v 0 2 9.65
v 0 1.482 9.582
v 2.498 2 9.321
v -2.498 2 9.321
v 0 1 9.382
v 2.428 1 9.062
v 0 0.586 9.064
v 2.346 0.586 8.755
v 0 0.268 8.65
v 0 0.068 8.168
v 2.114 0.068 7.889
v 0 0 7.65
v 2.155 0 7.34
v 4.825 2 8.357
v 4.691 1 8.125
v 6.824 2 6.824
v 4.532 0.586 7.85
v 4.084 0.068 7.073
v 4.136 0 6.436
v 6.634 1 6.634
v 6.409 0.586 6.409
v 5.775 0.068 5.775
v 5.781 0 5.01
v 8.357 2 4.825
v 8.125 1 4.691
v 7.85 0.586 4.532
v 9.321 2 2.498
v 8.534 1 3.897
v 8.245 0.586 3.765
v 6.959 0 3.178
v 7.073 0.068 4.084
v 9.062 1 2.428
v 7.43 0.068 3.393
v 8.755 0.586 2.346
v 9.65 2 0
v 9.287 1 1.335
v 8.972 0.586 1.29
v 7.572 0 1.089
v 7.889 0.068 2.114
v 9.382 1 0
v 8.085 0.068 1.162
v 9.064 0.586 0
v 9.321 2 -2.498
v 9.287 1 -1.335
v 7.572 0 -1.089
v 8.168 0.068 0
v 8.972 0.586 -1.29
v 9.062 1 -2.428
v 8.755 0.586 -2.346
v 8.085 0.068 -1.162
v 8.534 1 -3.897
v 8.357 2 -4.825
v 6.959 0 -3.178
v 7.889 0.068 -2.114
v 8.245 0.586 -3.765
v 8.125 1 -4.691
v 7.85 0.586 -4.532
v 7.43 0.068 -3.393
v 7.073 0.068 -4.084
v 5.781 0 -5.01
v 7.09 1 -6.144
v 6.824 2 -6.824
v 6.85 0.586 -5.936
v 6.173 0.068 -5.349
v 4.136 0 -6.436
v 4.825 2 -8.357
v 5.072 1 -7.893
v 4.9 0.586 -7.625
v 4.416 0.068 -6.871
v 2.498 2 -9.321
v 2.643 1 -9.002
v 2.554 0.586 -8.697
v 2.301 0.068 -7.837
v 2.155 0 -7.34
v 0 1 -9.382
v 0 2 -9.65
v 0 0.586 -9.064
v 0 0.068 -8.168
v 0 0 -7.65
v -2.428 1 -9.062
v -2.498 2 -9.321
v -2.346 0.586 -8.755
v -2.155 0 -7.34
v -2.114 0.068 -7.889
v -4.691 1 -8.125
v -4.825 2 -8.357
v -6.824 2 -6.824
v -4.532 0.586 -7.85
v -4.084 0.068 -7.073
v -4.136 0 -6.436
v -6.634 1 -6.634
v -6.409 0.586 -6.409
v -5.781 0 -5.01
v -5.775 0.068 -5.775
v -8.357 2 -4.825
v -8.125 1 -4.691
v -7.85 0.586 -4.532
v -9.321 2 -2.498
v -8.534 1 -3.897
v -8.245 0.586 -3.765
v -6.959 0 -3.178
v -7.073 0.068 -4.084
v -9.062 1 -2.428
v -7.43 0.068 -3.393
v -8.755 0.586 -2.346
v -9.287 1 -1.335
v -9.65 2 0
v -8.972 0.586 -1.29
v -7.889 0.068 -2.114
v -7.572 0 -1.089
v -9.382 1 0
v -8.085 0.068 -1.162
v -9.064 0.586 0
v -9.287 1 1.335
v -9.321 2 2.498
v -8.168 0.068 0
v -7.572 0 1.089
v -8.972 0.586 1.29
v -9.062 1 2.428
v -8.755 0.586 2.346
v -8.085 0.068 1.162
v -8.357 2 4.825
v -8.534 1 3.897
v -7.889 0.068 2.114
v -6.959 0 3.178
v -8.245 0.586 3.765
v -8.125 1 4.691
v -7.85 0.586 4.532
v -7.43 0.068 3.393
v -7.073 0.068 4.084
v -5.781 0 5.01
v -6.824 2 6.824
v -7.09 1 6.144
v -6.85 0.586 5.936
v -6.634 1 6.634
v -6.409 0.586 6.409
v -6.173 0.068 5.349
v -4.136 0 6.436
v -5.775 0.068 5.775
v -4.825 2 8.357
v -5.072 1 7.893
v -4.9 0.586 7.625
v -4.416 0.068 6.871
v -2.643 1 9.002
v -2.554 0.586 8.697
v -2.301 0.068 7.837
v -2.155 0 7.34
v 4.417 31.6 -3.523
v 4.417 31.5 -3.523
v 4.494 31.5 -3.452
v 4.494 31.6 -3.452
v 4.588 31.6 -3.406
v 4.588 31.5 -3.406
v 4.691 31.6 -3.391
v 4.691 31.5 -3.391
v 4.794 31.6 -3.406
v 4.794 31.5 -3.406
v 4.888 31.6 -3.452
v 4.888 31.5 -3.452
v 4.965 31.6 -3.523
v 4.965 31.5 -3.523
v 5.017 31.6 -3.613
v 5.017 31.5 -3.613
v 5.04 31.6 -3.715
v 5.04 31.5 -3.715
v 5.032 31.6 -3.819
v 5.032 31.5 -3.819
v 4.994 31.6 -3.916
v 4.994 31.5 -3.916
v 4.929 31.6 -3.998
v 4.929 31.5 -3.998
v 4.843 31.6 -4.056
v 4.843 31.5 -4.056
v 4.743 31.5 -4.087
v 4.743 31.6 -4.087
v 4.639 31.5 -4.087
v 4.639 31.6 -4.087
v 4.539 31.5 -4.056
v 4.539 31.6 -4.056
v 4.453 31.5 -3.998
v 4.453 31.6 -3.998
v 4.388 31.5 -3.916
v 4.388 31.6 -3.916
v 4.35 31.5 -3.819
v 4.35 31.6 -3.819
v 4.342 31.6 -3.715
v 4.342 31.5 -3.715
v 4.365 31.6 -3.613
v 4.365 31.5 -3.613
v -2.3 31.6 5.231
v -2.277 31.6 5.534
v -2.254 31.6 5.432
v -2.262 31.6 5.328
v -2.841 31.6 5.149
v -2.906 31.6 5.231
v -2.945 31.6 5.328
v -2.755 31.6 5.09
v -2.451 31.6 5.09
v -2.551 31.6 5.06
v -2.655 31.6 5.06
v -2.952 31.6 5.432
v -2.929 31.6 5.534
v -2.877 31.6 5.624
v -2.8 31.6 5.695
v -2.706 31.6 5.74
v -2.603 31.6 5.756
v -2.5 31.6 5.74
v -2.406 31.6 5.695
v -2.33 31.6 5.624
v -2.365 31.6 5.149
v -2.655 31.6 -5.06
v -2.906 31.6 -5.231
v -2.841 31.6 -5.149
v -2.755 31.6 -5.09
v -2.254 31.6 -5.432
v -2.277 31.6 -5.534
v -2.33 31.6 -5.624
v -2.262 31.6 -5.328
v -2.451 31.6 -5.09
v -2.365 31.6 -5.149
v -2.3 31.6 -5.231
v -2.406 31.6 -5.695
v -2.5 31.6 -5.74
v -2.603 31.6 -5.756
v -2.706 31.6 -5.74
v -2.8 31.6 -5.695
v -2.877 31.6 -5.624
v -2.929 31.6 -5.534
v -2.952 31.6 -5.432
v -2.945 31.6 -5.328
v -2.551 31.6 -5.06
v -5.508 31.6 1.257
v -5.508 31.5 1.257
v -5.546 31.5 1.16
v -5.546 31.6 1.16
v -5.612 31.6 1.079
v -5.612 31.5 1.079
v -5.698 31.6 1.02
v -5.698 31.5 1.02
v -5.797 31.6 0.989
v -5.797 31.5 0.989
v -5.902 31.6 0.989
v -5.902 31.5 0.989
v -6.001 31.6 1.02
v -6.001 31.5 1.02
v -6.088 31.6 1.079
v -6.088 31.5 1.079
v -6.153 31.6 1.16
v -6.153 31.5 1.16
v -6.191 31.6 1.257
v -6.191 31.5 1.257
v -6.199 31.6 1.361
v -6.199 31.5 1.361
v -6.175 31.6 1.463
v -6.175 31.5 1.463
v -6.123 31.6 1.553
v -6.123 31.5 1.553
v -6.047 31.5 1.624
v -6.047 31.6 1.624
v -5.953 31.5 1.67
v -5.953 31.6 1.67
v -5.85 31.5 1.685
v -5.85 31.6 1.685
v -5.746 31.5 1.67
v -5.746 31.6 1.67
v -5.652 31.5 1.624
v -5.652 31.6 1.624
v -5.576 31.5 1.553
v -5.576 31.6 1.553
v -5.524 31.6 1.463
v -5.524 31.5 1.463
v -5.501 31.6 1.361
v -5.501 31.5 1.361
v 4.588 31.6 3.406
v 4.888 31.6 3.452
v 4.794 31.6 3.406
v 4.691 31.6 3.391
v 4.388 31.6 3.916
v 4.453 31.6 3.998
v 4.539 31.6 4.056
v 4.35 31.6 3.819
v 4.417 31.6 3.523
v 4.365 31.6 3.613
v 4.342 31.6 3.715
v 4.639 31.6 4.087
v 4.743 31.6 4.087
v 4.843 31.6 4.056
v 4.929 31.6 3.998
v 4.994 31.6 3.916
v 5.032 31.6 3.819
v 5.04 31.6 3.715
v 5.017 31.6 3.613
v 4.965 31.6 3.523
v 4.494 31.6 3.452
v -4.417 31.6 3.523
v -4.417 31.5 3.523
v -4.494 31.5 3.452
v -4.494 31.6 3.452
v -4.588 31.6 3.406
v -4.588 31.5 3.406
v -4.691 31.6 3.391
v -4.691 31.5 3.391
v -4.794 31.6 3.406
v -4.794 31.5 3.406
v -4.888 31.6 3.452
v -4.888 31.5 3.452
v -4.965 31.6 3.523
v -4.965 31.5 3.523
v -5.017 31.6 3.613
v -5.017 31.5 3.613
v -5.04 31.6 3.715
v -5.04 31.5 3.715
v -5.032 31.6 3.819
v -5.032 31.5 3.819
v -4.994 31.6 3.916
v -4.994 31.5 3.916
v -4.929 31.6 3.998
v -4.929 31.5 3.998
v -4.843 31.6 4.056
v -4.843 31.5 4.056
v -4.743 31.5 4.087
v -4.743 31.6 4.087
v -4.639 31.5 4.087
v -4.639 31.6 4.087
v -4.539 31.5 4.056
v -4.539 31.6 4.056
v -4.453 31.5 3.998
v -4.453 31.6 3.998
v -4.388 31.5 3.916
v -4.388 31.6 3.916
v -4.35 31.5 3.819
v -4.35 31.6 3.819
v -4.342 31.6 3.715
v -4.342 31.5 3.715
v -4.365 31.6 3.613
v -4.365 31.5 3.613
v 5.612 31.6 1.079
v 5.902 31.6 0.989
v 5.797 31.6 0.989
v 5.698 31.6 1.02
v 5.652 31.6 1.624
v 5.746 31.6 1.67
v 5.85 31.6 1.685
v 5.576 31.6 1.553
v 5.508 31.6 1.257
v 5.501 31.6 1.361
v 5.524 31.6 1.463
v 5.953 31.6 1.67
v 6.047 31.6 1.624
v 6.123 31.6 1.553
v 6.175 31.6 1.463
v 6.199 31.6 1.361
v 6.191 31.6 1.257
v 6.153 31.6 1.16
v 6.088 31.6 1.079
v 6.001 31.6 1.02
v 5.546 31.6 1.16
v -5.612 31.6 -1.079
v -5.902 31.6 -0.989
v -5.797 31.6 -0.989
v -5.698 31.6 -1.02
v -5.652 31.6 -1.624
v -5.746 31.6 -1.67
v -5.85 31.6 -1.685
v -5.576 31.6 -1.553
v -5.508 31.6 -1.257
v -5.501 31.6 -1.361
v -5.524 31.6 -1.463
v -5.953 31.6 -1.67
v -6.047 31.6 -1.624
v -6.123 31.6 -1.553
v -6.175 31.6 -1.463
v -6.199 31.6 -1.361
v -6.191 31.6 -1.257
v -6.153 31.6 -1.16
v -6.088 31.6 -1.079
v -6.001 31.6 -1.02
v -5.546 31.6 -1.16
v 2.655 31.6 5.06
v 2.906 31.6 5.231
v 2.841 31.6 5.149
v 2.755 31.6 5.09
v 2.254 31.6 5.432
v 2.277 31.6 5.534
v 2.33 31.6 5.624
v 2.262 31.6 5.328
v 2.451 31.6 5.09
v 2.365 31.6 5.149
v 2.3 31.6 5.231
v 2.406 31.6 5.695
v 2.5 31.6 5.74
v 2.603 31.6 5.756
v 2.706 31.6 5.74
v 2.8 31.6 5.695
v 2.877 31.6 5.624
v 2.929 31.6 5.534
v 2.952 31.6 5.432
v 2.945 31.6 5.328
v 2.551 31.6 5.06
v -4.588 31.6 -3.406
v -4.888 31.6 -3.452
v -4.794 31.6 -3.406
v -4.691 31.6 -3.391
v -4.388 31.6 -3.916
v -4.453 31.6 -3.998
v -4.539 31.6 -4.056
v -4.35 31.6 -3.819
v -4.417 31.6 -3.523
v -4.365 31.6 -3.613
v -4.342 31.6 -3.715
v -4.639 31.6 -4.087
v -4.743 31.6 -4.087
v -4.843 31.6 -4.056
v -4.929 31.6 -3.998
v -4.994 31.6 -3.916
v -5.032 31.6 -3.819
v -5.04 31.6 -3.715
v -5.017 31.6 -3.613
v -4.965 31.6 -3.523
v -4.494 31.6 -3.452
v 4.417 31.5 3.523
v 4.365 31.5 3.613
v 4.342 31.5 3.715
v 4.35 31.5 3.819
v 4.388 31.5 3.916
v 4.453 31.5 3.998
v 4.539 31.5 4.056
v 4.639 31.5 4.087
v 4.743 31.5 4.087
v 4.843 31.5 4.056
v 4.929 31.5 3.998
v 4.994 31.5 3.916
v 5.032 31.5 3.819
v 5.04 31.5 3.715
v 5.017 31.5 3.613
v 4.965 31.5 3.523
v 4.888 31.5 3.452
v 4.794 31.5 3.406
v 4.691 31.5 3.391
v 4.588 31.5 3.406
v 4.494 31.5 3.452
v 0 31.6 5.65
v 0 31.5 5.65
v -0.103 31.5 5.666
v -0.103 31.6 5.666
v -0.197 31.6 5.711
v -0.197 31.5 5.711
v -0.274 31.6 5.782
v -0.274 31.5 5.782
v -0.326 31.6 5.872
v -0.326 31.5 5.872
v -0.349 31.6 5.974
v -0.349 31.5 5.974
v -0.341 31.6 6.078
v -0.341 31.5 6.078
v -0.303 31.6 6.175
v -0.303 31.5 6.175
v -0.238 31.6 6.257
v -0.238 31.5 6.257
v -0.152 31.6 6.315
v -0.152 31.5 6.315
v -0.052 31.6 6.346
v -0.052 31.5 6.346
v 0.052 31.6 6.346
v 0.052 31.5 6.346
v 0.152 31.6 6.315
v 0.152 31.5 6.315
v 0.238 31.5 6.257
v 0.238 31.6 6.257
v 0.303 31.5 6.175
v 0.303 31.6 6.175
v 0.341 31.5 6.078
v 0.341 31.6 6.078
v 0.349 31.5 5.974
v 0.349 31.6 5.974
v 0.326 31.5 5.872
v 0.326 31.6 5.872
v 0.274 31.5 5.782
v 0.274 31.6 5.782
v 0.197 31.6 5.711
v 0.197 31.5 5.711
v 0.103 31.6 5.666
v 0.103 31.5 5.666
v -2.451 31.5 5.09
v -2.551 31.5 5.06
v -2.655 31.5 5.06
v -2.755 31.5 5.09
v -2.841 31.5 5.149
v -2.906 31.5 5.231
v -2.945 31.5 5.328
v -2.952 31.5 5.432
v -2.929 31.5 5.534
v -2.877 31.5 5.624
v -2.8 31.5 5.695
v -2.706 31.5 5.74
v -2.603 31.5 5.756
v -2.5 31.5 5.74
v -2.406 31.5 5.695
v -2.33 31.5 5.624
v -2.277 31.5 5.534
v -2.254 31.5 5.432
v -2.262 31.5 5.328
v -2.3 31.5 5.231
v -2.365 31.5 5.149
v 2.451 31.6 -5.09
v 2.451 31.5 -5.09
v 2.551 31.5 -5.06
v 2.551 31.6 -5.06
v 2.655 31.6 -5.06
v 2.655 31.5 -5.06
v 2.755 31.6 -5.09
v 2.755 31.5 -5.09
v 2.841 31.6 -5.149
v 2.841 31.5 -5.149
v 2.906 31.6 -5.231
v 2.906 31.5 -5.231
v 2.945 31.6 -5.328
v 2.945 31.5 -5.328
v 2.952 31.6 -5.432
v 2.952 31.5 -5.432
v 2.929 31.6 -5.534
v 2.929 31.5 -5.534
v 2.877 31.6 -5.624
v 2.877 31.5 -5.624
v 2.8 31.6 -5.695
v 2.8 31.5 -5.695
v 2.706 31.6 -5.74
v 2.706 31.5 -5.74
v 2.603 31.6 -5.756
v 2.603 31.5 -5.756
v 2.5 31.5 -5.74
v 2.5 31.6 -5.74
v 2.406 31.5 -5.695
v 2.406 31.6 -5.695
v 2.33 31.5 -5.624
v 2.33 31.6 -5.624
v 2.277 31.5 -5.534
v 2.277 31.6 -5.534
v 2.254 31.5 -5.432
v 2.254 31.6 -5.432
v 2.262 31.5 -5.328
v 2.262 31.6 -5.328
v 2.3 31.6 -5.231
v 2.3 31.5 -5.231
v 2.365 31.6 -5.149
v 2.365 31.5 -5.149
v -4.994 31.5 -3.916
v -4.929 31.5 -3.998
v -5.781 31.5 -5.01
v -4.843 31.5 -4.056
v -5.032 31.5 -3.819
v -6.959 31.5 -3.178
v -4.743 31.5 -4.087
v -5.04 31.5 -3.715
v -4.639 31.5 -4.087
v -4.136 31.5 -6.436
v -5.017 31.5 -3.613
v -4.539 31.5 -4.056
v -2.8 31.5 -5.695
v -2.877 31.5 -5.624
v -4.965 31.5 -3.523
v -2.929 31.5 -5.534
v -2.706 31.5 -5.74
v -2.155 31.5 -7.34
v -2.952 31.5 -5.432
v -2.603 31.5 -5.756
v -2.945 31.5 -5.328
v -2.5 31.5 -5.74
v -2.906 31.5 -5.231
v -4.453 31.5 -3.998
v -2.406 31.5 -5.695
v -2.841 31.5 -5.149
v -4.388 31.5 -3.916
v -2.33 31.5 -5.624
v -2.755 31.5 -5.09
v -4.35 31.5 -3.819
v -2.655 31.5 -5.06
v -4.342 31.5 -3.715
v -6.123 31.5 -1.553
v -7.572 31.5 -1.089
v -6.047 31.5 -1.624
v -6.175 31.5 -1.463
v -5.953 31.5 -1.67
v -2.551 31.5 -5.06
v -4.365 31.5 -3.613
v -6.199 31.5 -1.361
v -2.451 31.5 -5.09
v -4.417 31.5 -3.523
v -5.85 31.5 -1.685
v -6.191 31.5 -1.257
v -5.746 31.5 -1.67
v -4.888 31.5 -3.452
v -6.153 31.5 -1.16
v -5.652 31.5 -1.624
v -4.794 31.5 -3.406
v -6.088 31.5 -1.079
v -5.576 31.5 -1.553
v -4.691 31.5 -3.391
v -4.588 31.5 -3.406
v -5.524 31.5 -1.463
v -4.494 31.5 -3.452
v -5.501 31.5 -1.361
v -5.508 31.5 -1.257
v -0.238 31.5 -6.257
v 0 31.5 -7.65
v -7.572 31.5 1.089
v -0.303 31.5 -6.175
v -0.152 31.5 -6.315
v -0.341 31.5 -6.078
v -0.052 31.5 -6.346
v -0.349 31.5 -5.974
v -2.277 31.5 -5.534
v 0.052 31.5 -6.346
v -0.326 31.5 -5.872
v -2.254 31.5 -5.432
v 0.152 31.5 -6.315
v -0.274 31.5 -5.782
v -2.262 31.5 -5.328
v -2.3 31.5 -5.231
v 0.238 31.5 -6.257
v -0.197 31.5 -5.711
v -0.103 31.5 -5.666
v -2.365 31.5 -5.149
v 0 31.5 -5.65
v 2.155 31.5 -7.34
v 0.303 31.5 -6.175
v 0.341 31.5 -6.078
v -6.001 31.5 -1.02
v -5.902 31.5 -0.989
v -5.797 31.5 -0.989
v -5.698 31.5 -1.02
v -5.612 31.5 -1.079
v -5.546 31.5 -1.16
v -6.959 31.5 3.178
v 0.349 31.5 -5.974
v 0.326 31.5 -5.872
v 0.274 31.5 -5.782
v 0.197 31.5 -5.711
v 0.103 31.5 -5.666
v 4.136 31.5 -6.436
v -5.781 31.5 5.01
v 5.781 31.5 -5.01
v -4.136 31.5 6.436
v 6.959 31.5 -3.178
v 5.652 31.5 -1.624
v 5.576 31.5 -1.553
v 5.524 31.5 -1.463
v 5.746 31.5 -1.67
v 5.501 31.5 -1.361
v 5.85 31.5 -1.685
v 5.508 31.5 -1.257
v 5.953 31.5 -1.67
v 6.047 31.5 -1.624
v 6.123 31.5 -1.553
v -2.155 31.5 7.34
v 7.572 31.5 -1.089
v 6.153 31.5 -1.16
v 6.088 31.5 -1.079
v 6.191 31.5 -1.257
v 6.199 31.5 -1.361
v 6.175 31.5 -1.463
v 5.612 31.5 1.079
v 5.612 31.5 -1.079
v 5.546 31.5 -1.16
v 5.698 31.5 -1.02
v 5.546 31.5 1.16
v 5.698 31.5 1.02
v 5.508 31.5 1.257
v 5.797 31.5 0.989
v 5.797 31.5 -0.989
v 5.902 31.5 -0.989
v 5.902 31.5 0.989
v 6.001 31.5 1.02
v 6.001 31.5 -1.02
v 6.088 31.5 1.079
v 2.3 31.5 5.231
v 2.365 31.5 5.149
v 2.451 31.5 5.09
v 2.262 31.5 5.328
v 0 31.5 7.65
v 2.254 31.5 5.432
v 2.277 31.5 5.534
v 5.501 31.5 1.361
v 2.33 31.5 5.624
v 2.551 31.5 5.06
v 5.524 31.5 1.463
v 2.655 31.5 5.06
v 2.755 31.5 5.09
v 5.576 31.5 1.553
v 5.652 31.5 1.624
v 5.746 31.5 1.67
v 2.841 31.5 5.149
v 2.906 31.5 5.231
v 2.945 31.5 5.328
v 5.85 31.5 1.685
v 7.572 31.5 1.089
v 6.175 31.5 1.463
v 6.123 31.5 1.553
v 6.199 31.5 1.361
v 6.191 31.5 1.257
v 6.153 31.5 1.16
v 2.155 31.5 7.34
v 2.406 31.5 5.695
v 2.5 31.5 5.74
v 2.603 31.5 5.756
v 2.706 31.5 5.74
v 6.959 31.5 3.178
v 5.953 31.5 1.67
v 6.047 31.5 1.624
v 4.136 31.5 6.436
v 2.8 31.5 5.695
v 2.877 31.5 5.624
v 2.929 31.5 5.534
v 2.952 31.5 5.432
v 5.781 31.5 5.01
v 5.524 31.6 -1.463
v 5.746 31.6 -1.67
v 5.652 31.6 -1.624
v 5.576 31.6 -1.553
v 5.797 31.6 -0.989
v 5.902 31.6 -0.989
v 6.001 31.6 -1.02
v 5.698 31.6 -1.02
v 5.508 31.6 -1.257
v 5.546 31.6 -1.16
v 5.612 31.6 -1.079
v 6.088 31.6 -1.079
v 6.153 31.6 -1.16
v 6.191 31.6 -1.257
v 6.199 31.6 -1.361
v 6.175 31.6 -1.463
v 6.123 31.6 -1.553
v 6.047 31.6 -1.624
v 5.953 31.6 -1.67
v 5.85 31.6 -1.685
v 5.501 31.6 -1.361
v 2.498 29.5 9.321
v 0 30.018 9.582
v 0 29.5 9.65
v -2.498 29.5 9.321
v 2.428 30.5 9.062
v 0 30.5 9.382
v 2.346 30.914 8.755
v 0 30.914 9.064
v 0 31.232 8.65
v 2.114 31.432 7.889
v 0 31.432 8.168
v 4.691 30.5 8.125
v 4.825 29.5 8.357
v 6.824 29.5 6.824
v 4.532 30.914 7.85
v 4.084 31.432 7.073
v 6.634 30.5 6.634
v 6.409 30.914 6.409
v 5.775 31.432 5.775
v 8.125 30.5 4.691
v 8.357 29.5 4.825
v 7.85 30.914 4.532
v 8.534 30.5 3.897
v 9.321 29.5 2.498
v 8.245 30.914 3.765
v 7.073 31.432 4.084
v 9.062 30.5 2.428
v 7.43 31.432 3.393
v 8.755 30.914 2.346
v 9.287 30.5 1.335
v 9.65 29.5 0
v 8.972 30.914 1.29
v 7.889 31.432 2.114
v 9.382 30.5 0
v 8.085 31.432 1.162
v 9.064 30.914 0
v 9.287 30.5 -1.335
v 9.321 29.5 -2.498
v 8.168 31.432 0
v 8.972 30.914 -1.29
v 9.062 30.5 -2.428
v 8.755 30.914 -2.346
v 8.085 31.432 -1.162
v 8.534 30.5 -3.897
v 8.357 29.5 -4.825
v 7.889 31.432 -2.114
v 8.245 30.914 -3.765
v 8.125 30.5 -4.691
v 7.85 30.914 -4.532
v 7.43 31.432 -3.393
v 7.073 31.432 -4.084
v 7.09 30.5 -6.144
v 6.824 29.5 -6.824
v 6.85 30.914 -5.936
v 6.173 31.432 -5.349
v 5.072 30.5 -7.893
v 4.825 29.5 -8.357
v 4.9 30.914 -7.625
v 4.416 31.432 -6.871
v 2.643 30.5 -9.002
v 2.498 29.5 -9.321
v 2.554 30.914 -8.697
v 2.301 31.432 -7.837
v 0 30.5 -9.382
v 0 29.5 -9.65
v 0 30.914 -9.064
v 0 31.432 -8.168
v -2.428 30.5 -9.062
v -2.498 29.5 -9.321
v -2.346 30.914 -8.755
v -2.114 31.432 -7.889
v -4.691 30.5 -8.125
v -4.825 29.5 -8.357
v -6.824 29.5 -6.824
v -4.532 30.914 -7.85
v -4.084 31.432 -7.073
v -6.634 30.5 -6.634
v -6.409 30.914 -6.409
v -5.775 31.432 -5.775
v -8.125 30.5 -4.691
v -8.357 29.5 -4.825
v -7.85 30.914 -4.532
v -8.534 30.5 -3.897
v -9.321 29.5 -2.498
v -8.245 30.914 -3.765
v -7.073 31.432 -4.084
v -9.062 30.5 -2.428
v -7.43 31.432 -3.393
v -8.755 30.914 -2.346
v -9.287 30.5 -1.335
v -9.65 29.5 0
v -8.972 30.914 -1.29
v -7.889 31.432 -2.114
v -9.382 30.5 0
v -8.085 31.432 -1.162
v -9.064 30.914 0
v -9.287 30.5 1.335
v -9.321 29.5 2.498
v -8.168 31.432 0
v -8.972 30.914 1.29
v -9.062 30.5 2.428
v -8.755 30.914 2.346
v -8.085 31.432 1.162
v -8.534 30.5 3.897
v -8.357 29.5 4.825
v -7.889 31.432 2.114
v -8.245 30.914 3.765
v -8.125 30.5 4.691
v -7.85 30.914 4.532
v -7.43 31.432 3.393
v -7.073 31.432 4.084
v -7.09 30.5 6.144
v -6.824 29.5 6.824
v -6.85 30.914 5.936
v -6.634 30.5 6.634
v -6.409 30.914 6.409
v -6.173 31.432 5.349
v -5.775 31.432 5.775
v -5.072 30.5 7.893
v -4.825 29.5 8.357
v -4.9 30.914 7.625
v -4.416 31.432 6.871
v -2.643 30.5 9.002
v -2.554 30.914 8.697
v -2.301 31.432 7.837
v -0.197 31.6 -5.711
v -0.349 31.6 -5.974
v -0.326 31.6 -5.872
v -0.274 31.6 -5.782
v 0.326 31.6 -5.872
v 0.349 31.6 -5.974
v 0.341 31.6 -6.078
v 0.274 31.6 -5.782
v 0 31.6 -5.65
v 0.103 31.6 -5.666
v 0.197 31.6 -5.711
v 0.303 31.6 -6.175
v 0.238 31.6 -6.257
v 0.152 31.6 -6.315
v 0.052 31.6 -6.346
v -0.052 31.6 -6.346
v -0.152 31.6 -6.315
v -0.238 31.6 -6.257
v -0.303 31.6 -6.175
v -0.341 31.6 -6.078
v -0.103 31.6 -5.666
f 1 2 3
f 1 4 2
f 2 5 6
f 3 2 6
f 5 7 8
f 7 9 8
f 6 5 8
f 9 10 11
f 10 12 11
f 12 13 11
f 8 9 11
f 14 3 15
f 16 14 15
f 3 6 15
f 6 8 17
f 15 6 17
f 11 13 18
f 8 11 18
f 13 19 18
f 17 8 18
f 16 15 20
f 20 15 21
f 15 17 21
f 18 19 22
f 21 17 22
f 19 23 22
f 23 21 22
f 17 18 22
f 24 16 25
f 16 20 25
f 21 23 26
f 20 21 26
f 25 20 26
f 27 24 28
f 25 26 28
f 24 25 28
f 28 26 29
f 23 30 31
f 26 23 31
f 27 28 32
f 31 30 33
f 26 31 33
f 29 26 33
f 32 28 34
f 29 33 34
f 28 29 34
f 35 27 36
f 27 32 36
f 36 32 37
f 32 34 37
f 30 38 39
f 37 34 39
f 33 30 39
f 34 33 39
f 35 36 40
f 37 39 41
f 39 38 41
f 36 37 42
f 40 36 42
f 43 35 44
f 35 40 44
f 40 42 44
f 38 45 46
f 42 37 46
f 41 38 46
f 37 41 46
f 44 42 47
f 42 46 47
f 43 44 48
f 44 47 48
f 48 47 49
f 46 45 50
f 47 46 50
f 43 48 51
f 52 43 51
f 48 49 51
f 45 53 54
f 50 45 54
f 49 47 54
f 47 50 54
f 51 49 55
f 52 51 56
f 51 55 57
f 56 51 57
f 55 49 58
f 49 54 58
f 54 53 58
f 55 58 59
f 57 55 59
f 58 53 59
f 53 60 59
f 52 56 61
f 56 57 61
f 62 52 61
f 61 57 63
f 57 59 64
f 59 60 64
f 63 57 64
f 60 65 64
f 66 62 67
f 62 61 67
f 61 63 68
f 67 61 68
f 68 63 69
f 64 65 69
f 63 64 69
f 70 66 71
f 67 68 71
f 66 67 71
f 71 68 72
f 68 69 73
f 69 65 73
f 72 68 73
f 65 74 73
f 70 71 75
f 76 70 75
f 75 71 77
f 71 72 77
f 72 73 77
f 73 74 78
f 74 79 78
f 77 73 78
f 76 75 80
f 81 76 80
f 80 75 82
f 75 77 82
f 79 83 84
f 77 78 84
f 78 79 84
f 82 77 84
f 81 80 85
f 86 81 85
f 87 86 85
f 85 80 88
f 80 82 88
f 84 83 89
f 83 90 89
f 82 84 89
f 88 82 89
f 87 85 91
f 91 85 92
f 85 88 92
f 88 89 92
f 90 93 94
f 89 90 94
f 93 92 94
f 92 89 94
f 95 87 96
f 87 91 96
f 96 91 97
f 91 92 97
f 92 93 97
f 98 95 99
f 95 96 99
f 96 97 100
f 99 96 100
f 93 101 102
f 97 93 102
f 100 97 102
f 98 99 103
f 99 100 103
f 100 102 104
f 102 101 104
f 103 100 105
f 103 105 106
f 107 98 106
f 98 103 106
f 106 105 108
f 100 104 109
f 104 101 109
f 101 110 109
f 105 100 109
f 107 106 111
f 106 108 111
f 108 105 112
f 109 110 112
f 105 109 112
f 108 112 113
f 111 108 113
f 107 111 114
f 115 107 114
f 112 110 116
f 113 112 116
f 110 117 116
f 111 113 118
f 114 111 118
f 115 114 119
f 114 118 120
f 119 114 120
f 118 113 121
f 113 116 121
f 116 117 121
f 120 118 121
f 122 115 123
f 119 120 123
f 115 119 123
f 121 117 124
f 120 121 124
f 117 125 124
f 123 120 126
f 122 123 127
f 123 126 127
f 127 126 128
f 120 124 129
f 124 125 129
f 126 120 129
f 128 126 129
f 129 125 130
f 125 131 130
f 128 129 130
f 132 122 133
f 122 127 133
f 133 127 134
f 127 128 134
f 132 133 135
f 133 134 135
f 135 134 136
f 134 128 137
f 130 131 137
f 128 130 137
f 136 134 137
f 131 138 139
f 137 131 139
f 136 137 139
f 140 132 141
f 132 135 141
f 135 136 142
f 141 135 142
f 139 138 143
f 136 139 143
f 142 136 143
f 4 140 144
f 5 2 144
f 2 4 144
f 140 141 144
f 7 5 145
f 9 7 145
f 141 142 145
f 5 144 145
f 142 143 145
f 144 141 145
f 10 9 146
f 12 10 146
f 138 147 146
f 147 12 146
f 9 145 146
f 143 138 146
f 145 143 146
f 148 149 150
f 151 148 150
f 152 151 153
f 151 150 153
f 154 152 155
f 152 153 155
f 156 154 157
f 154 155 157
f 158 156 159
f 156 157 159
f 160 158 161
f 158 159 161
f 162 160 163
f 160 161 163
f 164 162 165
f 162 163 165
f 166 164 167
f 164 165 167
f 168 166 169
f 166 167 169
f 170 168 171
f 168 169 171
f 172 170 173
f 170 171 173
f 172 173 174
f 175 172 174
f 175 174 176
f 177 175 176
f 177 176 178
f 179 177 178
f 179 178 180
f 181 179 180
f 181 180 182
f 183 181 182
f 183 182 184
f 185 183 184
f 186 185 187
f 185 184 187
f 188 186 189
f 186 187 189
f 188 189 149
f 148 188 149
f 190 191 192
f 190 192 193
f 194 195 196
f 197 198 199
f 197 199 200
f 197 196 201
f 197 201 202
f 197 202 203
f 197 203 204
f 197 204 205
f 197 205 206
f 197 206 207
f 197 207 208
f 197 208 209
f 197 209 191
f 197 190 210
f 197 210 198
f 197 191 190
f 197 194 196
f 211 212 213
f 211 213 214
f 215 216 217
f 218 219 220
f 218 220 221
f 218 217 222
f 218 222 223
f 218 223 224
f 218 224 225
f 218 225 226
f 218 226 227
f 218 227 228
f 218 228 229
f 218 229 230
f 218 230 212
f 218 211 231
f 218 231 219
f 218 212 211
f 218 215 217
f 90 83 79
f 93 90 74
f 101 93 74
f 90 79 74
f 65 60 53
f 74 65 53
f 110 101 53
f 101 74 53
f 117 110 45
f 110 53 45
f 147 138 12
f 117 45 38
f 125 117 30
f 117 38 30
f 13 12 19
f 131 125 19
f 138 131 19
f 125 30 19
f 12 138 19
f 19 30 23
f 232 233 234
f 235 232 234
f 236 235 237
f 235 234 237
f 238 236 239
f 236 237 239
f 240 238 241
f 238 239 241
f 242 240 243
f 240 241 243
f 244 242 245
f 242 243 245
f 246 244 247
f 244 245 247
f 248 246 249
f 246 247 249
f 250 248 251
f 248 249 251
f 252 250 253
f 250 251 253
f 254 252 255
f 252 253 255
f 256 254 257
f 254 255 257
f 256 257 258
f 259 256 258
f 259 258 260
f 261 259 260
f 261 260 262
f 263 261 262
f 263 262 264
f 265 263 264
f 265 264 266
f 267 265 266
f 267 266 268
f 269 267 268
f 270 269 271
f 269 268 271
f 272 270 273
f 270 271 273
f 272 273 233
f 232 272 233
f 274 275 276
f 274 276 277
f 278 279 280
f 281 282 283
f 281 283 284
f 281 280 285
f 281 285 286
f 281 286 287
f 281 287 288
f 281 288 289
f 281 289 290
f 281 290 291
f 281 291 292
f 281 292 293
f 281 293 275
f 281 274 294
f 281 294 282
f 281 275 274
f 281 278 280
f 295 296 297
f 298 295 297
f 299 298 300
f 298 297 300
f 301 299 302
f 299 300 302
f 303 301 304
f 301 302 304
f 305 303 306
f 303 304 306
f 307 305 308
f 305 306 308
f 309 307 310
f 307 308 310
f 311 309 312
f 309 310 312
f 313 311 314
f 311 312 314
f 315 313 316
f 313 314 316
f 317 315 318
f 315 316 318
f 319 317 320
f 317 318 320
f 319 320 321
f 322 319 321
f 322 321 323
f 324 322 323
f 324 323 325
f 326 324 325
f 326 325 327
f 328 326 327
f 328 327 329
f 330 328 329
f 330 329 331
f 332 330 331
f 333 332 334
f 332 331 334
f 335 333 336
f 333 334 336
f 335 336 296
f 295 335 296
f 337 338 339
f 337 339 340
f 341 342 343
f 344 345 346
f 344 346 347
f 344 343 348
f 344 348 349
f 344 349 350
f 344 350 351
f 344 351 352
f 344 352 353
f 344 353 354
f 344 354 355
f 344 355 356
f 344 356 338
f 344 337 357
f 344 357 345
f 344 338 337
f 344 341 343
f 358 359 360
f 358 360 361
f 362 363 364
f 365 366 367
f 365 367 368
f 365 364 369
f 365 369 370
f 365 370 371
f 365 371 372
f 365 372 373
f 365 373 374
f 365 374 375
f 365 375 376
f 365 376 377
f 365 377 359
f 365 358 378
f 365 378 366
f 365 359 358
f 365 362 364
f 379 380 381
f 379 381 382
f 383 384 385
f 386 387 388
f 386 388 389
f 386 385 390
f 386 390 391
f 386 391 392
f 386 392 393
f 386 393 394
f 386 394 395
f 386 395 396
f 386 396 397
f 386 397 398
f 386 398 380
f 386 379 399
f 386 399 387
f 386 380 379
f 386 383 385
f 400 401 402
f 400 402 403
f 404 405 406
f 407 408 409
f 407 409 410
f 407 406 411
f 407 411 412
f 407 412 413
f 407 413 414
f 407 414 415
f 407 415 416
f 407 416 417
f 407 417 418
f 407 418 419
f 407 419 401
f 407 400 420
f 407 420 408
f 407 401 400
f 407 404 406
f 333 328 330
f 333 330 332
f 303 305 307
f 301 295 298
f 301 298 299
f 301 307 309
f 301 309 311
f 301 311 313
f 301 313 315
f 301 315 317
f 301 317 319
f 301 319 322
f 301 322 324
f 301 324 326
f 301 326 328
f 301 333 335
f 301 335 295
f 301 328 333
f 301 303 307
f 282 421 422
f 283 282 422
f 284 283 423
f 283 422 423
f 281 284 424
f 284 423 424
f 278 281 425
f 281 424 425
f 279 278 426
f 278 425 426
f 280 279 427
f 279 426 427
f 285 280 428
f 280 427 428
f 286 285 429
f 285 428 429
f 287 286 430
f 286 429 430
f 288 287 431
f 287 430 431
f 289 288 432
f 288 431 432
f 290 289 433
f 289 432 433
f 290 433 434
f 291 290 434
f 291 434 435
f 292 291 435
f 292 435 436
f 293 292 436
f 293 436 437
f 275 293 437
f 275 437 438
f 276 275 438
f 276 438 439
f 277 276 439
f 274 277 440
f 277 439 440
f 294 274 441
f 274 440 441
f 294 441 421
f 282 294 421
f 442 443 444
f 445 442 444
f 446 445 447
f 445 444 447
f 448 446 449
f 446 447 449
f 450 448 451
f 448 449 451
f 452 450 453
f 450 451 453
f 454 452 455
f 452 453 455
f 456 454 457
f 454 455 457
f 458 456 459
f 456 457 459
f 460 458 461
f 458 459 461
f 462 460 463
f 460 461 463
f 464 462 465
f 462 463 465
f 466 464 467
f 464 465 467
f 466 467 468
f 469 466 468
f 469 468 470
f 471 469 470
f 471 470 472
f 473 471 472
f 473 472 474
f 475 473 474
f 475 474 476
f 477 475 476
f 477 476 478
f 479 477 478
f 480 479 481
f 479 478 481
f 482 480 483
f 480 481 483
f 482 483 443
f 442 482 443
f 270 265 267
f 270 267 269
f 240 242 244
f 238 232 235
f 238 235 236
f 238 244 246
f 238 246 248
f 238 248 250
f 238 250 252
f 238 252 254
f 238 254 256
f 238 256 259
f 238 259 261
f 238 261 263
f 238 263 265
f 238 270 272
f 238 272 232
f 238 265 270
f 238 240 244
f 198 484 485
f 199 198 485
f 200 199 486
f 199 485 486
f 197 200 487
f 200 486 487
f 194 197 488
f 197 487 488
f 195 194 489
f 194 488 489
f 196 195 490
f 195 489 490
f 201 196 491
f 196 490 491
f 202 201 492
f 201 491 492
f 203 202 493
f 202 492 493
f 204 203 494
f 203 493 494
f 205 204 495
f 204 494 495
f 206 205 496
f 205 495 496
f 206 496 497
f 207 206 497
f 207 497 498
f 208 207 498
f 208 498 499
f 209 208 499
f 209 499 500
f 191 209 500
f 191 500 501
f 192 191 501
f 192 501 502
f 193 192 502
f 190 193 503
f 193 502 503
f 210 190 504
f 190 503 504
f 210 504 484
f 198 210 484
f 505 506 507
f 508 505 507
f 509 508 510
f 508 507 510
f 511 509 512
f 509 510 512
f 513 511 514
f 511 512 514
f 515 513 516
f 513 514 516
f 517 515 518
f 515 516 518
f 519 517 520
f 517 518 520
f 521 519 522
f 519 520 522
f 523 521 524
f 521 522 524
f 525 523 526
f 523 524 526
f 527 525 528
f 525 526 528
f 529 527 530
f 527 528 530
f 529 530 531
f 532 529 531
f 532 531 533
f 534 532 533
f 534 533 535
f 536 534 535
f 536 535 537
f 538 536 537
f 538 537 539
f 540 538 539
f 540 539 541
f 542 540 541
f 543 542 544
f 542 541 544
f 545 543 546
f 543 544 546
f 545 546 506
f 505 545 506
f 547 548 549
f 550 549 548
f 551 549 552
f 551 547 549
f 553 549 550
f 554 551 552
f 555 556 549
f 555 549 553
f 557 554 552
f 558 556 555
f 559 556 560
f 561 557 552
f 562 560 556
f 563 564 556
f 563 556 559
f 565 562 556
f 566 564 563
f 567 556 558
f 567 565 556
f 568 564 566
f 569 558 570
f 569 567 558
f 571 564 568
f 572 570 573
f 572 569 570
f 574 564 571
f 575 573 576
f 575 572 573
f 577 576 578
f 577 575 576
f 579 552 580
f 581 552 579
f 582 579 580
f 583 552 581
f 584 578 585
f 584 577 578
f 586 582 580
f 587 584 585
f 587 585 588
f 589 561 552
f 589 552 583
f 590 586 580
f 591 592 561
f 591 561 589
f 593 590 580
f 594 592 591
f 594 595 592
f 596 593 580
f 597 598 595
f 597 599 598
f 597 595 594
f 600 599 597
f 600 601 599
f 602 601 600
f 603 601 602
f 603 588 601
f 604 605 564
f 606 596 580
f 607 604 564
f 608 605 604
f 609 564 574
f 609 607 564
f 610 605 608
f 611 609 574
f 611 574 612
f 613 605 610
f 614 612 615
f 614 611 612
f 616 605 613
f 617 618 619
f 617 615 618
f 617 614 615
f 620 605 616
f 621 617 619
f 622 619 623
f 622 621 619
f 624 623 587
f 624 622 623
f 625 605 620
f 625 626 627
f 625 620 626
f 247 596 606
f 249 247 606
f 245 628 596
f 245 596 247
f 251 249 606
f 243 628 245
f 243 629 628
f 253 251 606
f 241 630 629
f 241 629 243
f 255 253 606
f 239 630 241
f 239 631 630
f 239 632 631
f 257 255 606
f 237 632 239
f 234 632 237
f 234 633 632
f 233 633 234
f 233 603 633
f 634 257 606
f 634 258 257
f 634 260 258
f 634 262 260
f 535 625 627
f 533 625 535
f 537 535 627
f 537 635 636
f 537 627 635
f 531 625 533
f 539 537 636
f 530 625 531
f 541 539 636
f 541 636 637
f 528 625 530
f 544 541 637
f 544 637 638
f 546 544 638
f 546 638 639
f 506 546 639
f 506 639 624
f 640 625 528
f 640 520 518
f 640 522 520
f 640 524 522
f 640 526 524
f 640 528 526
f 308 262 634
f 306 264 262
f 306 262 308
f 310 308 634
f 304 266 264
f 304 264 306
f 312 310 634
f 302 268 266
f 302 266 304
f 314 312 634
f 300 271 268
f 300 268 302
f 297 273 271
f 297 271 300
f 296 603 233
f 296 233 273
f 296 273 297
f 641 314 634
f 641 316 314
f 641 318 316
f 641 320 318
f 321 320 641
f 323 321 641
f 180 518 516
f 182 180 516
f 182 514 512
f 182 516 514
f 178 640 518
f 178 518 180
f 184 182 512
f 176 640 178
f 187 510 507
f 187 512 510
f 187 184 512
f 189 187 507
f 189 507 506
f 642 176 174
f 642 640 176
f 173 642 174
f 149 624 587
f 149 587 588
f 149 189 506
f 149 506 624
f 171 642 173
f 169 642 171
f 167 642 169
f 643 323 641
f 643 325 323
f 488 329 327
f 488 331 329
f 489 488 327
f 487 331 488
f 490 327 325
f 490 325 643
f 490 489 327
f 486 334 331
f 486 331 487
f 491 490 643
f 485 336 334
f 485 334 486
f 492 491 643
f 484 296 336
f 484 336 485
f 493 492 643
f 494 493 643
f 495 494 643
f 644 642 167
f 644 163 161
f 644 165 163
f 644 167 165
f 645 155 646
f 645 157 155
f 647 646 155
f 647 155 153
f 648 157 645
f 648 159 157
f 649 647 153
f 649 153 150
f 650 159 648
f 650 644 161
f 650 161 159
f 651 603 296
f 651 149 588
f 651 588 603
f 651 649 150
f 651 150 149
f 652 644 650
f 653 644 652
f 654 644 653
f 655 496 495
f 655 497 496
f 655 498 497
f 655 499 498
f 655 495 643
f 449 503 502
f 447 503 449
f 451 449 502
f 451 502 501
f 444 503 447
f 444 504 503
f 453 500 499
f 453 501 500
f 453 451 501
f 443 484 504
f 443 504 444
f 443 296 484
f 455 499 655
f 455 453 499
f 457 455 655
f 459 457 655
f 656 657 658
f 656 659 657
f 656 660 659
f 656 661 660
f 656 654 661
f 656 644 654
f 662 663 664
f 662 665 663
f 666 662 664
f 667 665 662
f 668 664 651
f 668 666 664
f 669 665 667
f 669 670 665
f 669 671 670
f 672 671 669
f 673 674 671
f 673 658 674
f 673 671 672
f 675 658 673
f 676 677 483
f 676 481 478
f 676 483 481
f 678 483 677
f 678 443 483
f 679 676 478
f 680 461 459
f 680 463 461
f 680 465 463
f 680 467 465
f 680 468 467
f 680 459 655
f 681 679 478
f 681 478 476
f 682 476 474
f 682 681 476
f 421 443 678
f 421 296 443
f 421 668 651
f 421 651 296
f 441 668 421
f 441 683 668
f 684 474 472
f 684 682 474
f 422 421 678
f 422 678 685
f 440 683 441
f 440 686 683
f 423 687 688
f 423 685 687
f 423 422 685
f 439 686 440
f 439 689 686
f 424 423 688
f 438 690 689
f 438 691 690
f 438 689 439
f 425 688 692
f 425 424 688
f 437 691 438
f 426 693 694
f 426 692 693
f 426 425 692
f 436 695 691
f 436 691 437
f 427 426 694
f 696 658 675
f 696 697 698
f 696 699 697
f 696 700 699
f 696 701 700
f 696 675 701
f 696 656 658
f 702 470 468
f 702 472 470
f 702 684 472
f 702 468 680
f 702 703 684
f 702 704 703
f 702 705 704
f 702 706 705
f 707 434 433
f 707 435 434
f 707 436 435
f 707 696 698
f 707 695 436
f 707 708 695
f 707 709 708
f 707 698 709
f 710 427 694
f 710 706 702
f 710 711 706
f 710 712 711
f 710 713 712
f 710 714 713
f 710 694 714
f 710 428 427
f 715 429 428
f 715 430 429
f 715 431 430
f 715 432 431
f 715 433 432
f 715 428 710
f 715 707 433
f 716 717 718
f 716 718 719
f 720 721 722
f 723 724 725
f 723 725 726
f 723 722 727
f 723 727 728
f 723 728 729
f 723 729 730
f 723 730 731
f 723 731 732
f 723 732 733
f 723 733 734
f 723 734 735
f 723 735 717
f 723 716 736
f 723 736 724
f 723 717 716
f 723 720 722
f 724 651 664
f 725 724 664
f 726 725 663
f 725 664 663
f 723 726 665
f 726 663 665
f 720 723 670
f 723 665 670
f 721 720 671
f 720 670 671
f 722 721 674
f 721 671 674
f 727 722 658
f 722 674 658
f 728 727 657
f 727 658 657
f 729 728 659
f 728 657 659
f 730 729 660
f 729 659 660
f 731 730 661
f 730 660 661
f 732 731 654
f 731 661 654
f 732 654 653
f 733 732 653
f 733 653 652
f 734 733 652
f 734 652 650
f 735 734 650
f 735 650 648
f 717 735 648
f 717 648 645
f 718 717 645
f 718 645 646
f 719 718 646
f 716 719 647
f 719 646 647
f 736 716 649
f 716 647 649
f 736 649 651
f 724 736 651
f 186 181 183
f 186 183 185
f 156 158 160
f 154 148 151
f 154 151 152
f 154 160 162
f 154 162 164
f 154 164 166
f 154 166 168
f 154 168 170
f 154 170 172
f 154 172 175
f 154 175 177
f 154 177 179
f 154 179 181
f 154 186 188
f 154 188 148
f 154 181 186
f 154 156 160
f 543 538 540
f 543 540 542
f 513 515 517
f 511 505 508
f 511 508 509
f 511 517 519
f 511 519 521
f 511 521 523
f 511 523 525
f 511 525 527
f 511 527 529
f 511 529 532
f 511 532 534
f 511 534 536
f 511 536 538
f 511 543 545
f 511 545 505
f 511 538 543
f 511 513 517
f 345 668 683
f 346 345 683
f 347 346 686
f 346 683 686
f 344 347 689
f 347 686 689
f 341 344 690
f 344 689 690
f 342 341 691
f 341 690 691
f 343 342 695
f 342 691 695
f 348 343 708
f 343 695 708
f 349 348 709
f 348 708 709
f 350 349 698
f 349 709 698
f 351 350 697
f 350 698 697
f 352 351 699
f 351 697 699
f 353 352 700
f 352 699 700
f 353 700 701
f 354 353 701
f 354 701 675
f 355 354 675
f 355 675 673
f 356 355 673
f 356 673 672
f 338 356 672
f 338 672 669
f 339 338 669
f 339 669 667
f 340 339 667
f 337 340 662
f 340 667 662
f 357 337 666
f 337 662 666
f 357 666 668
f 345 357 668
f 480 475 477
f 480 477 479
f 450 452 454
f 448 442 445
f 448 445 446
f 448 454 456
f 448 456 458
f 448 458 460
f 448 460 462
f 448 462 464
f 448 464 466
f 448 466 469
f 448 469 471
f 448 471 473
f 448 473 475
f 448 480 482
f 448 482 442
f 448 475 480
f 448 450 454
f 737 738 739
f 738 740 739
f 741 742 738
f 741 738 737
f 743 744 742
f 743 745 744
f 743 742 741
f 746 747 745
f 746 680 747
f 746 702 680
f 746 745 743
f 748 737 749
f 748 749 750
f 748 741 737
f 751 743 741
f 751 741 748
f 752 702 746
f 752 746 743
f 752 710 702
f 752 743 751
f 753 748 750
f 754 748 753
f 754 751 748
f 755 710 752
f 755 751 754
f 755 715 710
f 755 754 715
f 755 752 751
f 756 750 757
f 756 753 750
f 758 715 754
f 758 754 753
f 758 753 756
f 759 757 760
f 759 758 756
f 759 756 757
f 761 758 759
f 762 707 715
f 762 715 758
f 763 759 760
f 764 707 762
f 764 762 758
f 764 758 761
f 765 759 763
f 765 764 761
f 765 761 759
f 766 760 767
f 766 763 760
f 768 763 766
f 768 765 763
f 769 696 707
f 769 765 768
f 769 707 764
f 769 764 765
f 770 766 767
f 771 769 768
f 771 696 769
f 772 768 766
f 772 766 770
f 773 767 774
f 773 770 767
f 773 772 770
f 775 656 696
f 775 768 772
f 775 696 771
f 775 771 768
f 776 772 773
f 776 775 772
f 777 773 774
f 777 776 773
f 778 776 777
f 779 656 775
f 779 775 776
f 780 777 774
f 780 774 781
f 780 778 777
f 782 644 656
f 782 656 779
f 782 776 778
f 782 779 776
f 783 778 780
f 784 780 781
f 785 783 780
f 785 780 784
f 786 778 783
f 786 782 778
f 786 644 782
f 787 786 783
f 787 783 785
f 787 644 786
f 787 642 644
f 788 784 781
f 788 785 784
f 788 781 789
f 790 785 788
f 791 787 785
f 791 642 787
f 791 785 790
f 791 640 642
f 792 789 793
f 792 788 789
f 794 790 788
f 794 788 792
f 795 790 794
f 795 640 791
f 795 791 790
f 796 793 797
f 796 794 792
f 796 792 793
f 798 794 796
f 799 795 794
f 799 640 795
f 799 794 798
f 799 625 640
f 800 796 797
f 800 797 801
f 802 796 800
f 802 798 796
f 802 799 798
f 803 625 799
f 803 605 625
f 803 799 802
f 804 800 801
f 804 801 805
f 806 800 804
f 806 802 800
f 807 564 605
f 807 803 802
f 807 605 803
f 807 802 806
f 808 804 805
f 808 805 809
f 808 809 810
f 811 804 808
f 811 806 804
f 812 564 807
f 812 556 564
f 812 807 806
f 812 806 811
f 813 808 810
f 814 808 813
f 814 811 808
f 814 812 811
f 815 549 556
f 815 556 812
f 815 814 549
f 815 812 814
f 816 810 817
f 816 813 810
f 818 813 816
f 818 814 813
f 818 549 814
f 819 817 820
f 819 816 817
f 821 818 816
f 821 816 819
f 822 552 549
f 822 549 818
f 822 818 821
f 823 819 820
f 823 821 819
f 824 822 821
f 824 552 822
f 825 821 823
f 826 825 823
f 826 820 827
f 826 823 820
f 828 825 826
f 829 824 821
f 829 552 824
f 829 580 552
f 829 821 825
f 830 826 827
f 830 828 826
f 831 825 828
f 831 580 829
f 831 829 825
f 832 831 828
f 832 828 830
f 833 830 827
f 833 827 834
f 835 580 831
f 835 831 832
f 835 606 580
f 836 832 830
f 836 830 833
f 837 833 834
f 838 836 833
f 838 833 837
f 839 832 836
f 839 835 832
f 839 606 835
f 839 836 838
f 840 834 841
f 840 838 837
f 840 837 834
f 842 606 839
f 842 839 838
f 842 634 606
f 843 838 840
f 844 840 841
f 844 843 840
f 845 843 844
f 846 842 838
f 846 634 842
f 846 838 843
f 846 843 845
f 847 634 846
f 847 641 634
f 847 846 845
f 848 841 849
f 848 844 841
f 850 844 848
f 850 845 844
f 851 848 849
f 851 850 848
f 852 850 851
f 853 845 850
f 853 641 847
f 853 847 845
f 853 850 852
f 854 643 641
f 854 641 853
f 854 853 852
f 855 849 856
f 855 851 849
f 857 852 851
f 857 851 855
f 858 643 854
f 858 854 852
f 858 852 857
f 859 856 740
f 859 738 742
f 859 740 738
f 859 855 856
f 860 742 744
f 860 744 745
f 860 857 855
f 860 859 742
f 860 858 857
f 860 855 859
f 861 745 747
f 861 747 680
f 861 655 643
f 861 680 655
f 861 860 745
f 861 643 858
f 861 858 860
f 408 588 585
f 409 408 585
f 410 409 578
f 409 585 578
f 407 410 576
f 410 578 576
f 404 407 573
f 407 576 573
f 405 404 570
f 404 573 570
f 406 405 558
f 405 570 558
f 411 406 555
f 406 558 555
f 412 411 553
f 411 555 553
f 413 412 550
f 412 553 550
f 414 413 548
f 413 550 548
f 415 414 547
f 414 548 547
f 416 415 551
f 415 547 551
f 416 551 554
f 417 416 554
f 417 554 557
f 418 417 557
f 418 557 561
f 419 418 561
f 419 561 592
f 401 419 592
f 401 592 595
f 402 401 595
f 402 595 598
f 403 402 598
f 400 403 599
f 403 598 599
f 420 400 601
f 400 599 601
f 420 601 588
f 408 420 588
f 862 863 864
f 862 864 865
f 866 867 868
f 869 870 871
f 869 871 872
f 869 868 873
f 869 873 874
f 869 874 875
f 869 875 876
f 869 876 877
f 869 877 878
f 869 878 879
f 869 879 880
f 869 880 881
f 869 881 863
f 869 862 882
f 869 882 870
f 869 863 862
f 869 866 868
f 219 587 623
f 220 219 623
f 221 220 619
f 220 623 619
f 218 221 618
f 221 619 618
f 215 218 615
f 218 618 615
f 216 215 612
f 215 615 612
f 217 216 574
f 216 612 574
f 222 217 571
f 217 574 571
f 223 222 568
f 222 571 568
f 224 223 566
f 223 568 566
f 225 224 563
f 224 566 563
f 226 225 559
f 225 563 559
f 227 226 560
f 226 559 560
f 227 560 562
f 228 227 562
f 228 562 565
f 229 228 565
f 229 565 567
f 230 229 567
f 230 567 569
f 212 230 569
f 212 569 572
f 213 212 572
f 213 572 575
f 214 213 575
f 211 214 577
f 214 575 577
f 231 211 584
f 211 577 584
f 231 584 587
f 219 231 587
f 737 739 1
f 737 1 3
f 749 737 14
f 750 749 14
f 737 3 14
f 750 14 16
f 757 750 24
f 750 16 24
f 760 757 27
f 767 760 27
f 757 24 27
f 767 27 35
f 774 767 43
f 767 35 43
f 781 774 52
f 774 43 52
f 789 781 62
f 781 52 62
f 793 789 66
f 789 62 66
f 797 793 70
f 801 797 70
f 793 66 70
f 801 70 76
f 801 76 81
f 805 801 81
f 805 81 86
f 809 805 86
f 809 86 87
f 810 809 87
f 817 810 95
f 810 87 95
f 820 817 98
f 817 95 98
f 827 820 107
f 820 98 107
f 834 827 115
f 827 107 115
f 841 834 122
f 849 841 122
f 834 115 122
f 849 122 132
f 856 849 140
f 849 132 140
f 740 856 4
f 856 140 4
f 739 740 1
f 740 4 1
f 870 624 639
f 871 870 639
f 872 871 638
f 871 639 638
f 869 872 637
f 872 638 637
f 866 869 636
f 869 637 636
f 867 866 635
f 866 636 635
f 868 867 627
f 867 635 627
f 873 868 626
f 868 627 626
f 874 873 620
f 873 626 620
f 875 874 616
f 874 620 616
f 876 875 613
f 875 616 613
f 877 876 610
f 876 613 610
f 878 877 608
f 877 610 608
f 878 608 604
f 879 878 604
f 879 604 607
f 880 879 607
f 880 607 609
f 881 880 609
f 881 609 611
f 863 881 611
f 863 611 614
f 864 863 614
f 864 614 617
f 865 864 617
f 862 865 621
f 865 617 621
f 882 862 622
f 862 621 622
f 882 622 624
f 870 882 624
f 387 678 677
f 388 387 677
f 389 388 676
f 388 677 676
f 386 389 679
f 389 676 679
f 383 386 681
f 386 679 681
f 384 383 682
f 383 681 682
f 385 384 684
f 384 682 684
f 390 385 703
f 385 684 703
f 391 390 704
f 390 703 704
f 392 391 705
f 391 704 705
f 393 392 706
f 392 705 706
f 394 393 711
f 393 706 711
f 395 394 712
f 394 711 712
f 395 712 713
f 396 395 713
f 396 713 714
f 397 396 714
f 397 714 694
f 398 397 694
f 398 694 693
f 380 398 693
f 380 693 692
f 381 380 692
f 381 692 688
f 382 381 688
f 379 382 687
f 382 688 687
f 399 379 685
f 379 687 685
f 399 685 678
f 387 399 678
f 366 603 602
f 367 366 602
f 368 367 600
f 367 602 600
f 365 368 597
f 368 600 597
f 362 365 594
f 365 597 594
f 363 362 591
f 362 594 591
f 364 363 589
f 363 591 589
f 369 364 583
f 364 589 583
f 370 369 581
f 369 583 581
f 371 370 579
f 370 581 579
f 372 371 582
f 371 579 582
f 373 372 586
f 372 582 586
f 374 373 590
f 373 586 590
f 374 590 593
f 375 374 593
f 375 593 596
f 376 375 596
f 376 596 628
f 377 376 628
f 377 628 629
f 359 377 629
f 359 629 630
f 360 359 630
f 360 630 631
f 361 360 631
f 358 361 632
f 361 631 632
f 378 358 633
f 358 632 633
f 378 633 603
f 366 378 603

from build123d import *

# Parameters (mm, degrees)
SKETCH1_R           = 9.65
BOSS_EXTRUDE1_DEPTH = 31.5
FILLET4_R           = 2
SKETCH2_R           = 0.35
BOSS_EXTRUDE2_DEPTH = 0.1
CIRPATTERN1_COUNT   = 14


with BuildPart() as part:
    # Sketch1 → Boss-Extrude1 (new body)
    with BuildSketch(Plane(origin=(0, 0, 0), x_dir=(1, 0, 0), z_dir=(0, 1, 0))):
        with Locations(Location((0, 0, 0), (0, 0, 270))):
            Circle(SKETCH1_R)
    extrude(amount=BOSS_EXTRUDE1_DEPTH)

    # Fillet4
    fillet4_edges = [part.edges().sort_by_distance(p)[0] for p in [
        (0, 0, -9.65),
        (0, 31.5, -9.65),
    ]]
    fillet(fillet4_edges, radius=FILLET4_R)

    # Sketch2 → Boss-Extrude2 (add)
    with BuildSketch(Plane(origin=(0, 31.5, 0), x_dir=(1, 0, 0), z_dir=(0, 1, 0))):
        with Locations(Location((0, 6, 0), (0, 0, 270))):
            Circle(SKETCH2_R)
    boss_extrude2 = extrude(amount=BOSS_EXTRUDE2_DEPTH)

    # CirPattern1: Boss-Extrude2 ×14 about axis
    cirpattern1_axis = Axis((0, 0, 0), (0, 1, 0))
    for i in range(1, CIRPATTERN1_COUNT):
        add(boss_extrude2.rotate(cirpattern1_axis, i * 360 / CIRPATTERN1_COUNT))


solid = part.part
